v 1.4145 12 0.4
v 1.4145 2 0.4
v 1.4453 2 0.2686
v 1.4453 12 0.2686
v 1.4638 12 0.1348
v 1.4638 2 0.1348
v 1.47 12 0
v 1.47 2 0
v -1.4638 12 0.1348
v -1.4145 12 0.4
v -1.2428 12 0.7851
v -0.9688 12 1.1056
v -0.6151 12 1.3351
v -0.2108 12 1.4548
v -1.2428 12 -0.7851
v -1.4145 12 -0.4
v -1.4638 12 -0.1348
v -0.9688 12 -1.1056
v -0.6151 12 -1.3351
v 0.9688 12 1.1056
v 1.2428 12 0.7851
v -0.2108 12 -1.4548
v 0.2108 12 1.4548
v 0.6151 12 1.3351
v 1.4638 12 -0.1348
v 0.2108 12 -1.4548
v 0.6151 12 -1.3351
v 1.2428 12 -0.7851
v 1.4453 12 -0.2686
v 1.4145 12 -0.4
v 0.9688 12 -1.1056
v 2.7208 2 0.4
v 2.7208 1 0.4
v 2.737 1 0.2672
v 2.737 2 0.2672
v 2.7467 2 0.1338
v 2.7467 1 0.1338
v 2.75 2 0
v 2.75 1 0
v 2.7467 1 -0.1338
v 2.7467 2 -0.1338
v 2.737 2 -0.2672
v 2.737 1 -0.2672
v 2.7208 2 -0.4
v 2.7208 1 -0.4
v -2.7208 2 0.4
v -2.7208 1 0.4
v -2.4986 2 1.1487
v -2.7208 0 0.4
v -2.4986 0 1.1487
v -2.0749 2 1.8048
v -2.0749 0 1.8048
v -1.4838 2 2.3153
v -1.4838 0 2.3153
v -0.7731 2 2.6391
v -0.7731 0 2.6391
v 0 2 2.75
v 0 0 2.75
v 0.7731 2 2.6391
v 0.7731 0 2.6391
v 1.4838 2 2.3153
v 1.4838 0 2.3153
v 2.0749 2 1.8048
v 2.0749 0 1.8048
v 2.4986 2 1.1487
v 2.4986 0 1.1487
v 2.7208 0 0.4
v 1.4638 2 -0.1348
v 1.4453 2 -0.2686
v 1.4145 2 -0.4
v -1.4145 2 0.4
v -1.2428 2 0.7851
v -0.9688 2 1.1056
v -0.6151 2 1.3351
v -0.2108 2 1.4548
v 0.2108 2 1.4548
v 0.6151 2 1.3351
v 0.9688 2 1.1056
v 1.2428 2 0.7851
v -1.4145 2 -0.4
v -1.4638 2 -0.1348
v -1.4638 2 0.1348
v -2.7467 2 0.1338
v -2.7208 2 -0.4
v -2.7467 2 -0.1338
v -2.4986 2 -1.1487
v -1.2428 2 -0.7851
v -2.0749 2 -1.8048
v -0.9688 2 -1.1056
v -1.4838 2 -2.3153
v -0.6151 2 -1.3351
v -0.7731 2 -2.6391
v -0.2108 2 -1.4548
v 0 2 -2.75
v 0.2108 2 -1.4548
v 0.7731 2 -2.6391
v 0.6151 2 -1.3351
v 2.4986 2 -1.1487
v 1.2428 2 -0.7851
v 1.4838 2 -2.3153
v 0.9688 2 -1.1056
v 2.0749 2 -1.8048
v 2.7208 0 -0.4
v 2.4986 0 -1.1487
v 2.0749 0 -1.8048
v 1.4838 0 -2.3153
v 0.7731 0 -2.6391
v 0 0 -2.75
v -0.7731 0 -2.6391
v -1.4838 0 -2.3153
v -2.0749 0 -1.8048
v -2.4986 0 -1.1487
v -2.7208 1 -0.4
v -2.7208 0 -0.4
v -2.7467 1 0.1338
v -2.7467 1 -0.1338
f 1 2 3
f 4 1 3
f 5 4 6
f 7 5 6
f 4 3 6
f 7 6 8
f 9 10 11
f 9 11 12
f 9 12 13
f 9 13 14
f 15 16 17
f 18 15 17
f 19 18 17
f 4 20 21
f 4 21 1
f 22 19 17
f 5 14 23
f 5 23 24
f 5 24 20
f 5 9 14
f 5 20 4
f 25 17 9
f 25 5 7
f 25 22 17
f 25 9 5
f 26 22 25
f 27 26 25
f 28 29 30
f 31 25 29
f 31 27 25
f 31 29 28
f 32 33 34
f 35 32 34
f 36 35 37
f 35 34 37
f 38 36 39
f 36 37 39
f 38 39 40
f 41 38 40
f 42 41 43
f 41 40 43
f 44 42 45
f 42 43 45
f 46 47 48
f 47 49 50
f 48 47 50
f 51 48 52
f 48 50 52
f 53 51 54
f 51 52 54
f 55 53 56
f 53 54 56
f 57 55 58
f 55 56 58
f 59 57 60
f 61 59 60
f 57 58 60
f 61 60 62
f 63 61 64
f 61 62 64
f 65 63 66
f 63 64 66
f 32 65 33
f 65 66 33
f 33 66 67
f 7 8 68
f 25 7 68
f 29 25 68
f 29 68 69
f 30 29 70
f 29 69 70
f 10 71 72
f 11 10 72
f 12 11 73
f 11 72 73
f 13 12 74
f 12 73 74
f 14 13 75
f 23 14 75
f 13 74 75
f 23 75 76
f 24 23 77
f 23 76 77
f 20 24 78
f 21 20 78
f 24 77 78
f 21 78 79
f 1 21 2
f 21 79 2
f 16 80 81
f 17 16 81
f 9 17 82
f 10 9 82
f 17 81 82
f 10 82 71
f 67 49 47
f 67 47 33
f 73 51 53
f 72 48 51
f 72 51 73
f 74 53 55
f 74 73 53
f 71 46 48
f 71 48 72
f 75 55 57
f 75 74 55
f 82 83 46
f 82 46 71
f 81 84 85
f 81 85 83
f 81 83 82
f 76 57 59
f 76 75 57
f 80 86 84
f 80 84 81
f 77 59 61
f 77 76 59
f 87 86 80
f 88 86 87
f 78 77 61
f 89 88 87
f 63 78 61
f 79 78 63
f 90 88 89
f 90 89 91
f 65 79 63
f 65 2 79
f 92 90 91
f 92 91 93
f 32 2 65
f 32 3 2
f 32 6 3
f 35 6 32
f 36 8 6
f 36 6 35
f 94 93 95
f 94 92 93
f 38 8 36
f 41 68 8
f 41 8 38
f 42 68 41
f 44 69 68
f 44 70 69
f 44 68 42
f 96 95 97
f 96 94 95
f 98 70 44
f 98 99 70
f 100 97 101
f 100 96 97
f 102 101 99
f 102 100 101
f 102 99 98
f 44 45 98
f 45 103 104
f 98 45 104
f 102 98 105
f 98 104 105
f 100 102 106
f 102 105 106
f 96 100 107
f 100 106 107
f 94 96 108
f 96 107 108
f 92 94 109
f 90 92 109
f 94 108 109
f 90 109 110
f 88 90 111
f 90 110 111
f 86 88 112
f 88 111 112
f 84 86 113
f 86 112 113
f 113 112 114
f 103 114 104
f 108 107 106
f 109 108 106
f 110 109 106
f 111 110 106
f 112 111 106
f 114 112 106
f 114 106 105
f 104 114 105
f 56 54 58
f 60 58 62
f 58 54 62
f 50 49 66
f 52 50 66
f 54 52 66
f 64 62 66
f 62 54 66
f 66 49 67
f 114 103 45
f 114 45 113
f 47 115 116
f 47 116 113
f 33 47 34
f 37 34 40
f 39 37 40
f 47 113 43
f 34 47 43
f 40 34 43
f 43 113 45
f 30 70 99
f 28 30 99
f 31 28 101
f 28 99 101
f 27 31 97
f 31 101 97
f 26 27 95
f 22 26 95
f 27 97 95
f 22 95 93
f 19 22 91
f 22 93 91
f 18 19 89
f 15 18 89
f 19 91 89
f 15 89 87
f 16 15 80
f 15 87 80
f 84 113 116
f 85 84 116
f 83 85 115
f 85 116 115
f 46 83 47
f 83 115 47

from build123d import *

# Parameters (mm, degrees)
BOSS_EXTRUDE1_DEPTH = 2
CUT_EXTRUDE1_DEPTH  = 1
BOSS_EXTRUDE2_START = 2
BOSS_EXTRUDE2_DEPTH = 10


with BuildPart() as part:
    # Sketch1 → Boss-Extrude1 (new body)
    with BuildSketch(Plane(origin=(0, 0, 0), x_dir=(1, 0, 0), z_dir=(0, 1, 0))):
        with BuildLine():
            ThreePointArc((-1.414531725, 0.4), (0, 1.47), (1.414531725, 0.4))
            Line((1.414531725, 0.4), (2.720753572, 0.4))
            ThreePointArc((2.720753572, 0.4), (0, 2.75), (-2.720753572, 0.4))
            Line((-2.720753572, 0.4), (-1.414531725, 0.4))
        make_face()
        with BuildLine():
            Line((-1.414531725, 0.4), (0, 0.4))
            Line((0, 0.4), (1.414531725, 0.4))
            ThreePointArc((1.414531725, 0.4), (0, 1.47), (-1.414531725, 0.4))
        make_face()
        with BuildLine():
            Line((1.414531725, 0.4), (0, 0.4))
            Line((0, 0.4), (-1.414531725, 0.4))
            ThreePointArc((-1.414531725, 0.4), (-1.47, 0), (-1.414531725, -0.4))
            Line((-1.414531725, -0.4), (1.414531725, -0.4))
            ThreePointArc((1.414531725, -0.4), (1.4560669, -0.201913799), (1.47, 0))
            ThreePointArc((1.47, 0), (1.4560669, 0.201913799), (1.414531725, 0.4))
        make_face()
        with BuildLine():
            Line((1.414531725, -0.4), (-1.414531725, -0.4))
            ThreePointArc((-1.414531725, -0.4), (0, -1.47), (1.414531725, -0.4))
        make_face()
        with BuildLine():
            ThreePointArc((1.414531725, -0.4), (0, -1.47), (-1.414531725, -0.4))
            Line((-1.414531725, -0.4), (-2.720753572, -0.4))
            ThreePointArc((-2.720753572, -0.4), (0, -2.75), (2.720753572, -0.4))
            Line((2.720753572, -0.4), (1.414531725, -0.4))
        make_face()
        with BuildLine():
            Line((2.720753572, 0.4), (1.414531725, 0.4))
            ThreePointArc((1.414531725, 0.4), (1.4560669, 0.201913799), (1.47, 0))
            ThreePointArc((1.47, 0), (1.4560669, -0.201913799), (1.414531725, -0.4))
            Line((1.414531725, -0.4), (2.720753572, -0.4))
            ThreePointArc((2.720753572, -0.4), (2.742678647, -0.200533883), (2.75, 0))
            ThreePointArc((2.75, 0), (2.742678647, 0.200533883), (2.720753572, 0.4))
        make_face()
        with BuildLine():
            ThreePointArc((-1.414531725, -0.4), (-1.47, 0), (-1.414531725, 0.4))
            Line((-1.414531725, 0.4), (-2.720753572, 0.4))
            ThreePointArc((-2.720753572, 0.4), (-2.75, 0), (-2.720753572, -0.4))
            Line((-2.720753572, -0.4), (-1.414531725, -0.4))
        make_face()
    extrude(amount=BOSS_EXTRUDE1_DEPTH)

    # Sketch1<3> → Cut-Extrude1 (cut)
    with BuildSketch(Plane(origin=(0, 0, 0), x_dir=(1, 0, 0), z_dir=(0, 1, 0))):
        with BuildLine():
            Line((2.720753572, 0.4), (1.414531725, 0.4))
            ThreePointArc((1.414531725, 0.4), (1.4560669, 0.201913799), (1.47, 0))
            ThreePointArc((1.47, 0), (1.4560669, -0.201913799), (1.414531725, -0.4))
            Line((1.414531725, -0.4), (2.720753572, -0.4))
            ThreePointArc((2.720753572, -0.4), (2.742678647, -0.200533883), (2.75, 0))
            ThreePointArc((2.75, 0), (2.742678647, 0.200533883), (2.720753572, 0.4))
        make_face()
        with BuildLine():
            ThreePointArc((-1.414531725, -0.4), (-1.47, 0), (-1.414531725, 0.4))
            Line((-1.414531725, 0.4), (-2.720753572, 0.4))
            ThreePointArc((-2.720753572, 0.4), (-2.75, 0), (-2.720753572, -0.4))
            Line((-2.720753572, -0.4), (-1.414531725, -0.4))
        make_face()
        with BuildLine():
            Line((1.414531725, 0.4), (0, 0.4))
            Line((0, 0.4), (-1.414531725, 0.4))
            ThreePointArc((-1.414531725, 0.4), (-1.47, 0), (-1.414531725, -0.4))
            Line((-1.414531725, -0.4), (1.414531725, -0.4))
            ThreePointArc((1.414531725, -0.4), (1.4560669, -0.201913799), (1.47, 0))
            ThreePointArc((1.47, 0), (1.4560669, 0.201913799), (1.414531725, 0.4))
        make_face()
    extrude(amount=CUT_EXTRUDE1_DEPTH, mode=Mode.SUBTRACT)

    # Sketch1<4> → Boss-Extrude2 (add)
    with BuildSketch(Plane(origin=(0, 0, 0), x_dir=(1, 0, 0), z_dir=(0, 1, 0)).offset(BOSS_EXTRUDE2_START)):
        with BuildLine():
            Line((-1.414531725, 0.4), (0, 0.4))
            Line((0, 0.4), (1.414531725, 0.4))
            ThreePointArc((1.414531725, 0.4), (0, 1.47), (-1.414531725, 0.4))
        make_face()
        with BuildLine():
            Line((1.414531725, 0.4), (0, 0.4))
            Line((0, 0.4), (-1.414531725, 0.4))
            ThreePointArc((-1.414531725, 0.4), (-1.47, 0), (-1.414531725, -0.4))
            Line((-1.414531725, -0.4), (1.414531725, -0.4))
            ThreePointArc((1.414531725, -0.4), (1.4560669, -0.201913799), (1.47, 0))
            ThreePointArc((1.47, 0), (1.4560669, 0.201913799), (1.414531725, 0.4))
        make_face()
        with BuildLine():
            Line((1.414531725, -0.4), (-1.414531725, -0.4))
            ThreePointArc((-1.414531725, -0.4), (0, -1.47), (1.414531725, -0.4))
        make_face()
    extrude(amount=BOSS_EXTRUDE2_DEPTH)


solid = part.part
